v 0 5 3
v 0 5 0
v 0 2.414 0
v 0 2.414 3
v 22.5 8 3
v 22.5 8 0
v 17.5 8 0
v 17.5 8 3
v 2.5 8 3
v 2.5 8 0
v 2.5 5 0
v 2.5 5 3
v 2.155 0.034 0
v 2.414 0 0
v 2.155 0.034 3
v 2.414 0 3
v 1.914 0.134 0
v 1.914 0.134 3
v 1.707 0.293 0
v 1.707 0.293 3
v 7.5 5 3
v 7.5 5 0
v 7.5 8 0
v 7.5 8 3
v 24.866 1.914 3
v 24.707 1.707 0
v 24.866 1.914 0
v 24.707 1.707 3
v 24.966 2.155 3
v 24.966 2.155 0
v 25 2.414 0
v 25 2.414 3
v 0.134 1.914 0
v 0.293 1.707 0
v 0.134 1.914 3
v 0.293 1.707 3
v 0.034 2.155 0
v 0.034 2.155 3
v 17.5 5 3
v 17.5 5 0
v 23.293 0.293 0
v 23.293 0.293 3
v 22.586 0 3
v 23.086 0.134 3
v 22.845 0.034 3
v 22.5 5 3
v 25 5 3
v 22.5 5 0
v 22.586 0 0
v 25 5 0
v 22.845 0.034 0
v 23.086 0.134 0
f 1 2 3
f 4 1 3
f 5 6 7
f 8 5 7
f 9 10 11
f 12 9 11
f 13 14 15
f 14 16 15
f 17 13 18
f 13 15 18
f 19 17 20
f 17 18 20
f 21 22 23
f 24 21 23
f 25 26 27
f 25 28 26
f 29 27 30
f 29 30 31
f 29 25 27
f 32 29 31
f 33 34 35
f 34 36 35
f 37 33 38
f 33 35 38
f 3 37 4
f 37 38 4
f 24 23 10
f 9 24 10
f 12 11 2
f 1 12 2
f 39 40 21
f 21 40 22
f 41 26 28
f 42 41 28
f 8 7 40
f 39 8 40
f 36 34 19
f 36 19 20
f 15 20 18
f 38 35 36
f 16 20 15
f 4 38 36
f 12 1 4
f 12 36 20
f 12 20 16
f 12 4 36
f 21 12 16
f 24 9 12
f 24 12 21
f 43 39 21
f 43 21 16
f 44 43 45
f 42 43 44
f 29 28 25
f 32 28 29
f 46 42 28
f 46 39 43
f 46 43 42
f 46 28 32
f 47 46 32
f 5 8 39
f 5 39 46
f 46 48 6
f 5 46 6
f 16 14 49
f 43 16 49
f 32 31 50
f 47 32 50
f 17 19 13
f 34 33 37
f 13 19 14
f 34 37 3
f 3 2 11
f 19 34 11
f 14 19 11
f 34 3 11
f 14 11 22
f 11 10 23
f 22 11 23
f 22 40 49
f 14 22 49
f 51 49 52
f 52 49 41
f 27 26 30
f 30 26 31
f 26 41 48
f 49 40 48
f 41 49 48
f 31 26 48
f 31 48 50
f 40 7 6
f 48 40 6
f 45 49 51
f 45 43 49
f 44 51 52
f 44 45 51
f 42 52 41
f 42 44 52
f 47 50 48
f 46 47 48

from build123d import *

# Parameters (mm, degrees)
BOSS_EXTRUDE1_DEPTH = 3
CHAMFER1_SIZE       = 2
FILLET1_R           = 1


with BuildPart() as part:
    # Sketch1 → Boss-Extrude1 (new body)
    with BuildSketch(Plane.XY):
        Polygon((0, 0), (25, 0), (25, 5), (22.5, 5), (22.5, 8), (17.5, 8), (17.5, 5), (7.5, 5), (7.5, 8), (2.5, 8), (2.5, 5), (0, 5), align=None)
    extrude(amount=BOSS_EXTRUDE1_DEPTH)

    # Chamfer1
    chamfer1_edges = [part.edges().sort_by_distance(p)[0] for p in [
        (25, 0, 1.5),
        (0, 0, 1.5),
    ]]
    chamfer(chamfer1_edges, length=CHAMFER1_SIZE)

    # Fillet1
    fillet1_edges = [part.edges().sort_by_distance(p)[0] for p in [
        (25, 2, 1.5),
        (2, 0, 1.5),
        (23, 0, 1.5),
        (0, 2, 1.5),
    ]]
    fillet(fillet1_edges, radius=FILLET1_R)


solid = part.part
